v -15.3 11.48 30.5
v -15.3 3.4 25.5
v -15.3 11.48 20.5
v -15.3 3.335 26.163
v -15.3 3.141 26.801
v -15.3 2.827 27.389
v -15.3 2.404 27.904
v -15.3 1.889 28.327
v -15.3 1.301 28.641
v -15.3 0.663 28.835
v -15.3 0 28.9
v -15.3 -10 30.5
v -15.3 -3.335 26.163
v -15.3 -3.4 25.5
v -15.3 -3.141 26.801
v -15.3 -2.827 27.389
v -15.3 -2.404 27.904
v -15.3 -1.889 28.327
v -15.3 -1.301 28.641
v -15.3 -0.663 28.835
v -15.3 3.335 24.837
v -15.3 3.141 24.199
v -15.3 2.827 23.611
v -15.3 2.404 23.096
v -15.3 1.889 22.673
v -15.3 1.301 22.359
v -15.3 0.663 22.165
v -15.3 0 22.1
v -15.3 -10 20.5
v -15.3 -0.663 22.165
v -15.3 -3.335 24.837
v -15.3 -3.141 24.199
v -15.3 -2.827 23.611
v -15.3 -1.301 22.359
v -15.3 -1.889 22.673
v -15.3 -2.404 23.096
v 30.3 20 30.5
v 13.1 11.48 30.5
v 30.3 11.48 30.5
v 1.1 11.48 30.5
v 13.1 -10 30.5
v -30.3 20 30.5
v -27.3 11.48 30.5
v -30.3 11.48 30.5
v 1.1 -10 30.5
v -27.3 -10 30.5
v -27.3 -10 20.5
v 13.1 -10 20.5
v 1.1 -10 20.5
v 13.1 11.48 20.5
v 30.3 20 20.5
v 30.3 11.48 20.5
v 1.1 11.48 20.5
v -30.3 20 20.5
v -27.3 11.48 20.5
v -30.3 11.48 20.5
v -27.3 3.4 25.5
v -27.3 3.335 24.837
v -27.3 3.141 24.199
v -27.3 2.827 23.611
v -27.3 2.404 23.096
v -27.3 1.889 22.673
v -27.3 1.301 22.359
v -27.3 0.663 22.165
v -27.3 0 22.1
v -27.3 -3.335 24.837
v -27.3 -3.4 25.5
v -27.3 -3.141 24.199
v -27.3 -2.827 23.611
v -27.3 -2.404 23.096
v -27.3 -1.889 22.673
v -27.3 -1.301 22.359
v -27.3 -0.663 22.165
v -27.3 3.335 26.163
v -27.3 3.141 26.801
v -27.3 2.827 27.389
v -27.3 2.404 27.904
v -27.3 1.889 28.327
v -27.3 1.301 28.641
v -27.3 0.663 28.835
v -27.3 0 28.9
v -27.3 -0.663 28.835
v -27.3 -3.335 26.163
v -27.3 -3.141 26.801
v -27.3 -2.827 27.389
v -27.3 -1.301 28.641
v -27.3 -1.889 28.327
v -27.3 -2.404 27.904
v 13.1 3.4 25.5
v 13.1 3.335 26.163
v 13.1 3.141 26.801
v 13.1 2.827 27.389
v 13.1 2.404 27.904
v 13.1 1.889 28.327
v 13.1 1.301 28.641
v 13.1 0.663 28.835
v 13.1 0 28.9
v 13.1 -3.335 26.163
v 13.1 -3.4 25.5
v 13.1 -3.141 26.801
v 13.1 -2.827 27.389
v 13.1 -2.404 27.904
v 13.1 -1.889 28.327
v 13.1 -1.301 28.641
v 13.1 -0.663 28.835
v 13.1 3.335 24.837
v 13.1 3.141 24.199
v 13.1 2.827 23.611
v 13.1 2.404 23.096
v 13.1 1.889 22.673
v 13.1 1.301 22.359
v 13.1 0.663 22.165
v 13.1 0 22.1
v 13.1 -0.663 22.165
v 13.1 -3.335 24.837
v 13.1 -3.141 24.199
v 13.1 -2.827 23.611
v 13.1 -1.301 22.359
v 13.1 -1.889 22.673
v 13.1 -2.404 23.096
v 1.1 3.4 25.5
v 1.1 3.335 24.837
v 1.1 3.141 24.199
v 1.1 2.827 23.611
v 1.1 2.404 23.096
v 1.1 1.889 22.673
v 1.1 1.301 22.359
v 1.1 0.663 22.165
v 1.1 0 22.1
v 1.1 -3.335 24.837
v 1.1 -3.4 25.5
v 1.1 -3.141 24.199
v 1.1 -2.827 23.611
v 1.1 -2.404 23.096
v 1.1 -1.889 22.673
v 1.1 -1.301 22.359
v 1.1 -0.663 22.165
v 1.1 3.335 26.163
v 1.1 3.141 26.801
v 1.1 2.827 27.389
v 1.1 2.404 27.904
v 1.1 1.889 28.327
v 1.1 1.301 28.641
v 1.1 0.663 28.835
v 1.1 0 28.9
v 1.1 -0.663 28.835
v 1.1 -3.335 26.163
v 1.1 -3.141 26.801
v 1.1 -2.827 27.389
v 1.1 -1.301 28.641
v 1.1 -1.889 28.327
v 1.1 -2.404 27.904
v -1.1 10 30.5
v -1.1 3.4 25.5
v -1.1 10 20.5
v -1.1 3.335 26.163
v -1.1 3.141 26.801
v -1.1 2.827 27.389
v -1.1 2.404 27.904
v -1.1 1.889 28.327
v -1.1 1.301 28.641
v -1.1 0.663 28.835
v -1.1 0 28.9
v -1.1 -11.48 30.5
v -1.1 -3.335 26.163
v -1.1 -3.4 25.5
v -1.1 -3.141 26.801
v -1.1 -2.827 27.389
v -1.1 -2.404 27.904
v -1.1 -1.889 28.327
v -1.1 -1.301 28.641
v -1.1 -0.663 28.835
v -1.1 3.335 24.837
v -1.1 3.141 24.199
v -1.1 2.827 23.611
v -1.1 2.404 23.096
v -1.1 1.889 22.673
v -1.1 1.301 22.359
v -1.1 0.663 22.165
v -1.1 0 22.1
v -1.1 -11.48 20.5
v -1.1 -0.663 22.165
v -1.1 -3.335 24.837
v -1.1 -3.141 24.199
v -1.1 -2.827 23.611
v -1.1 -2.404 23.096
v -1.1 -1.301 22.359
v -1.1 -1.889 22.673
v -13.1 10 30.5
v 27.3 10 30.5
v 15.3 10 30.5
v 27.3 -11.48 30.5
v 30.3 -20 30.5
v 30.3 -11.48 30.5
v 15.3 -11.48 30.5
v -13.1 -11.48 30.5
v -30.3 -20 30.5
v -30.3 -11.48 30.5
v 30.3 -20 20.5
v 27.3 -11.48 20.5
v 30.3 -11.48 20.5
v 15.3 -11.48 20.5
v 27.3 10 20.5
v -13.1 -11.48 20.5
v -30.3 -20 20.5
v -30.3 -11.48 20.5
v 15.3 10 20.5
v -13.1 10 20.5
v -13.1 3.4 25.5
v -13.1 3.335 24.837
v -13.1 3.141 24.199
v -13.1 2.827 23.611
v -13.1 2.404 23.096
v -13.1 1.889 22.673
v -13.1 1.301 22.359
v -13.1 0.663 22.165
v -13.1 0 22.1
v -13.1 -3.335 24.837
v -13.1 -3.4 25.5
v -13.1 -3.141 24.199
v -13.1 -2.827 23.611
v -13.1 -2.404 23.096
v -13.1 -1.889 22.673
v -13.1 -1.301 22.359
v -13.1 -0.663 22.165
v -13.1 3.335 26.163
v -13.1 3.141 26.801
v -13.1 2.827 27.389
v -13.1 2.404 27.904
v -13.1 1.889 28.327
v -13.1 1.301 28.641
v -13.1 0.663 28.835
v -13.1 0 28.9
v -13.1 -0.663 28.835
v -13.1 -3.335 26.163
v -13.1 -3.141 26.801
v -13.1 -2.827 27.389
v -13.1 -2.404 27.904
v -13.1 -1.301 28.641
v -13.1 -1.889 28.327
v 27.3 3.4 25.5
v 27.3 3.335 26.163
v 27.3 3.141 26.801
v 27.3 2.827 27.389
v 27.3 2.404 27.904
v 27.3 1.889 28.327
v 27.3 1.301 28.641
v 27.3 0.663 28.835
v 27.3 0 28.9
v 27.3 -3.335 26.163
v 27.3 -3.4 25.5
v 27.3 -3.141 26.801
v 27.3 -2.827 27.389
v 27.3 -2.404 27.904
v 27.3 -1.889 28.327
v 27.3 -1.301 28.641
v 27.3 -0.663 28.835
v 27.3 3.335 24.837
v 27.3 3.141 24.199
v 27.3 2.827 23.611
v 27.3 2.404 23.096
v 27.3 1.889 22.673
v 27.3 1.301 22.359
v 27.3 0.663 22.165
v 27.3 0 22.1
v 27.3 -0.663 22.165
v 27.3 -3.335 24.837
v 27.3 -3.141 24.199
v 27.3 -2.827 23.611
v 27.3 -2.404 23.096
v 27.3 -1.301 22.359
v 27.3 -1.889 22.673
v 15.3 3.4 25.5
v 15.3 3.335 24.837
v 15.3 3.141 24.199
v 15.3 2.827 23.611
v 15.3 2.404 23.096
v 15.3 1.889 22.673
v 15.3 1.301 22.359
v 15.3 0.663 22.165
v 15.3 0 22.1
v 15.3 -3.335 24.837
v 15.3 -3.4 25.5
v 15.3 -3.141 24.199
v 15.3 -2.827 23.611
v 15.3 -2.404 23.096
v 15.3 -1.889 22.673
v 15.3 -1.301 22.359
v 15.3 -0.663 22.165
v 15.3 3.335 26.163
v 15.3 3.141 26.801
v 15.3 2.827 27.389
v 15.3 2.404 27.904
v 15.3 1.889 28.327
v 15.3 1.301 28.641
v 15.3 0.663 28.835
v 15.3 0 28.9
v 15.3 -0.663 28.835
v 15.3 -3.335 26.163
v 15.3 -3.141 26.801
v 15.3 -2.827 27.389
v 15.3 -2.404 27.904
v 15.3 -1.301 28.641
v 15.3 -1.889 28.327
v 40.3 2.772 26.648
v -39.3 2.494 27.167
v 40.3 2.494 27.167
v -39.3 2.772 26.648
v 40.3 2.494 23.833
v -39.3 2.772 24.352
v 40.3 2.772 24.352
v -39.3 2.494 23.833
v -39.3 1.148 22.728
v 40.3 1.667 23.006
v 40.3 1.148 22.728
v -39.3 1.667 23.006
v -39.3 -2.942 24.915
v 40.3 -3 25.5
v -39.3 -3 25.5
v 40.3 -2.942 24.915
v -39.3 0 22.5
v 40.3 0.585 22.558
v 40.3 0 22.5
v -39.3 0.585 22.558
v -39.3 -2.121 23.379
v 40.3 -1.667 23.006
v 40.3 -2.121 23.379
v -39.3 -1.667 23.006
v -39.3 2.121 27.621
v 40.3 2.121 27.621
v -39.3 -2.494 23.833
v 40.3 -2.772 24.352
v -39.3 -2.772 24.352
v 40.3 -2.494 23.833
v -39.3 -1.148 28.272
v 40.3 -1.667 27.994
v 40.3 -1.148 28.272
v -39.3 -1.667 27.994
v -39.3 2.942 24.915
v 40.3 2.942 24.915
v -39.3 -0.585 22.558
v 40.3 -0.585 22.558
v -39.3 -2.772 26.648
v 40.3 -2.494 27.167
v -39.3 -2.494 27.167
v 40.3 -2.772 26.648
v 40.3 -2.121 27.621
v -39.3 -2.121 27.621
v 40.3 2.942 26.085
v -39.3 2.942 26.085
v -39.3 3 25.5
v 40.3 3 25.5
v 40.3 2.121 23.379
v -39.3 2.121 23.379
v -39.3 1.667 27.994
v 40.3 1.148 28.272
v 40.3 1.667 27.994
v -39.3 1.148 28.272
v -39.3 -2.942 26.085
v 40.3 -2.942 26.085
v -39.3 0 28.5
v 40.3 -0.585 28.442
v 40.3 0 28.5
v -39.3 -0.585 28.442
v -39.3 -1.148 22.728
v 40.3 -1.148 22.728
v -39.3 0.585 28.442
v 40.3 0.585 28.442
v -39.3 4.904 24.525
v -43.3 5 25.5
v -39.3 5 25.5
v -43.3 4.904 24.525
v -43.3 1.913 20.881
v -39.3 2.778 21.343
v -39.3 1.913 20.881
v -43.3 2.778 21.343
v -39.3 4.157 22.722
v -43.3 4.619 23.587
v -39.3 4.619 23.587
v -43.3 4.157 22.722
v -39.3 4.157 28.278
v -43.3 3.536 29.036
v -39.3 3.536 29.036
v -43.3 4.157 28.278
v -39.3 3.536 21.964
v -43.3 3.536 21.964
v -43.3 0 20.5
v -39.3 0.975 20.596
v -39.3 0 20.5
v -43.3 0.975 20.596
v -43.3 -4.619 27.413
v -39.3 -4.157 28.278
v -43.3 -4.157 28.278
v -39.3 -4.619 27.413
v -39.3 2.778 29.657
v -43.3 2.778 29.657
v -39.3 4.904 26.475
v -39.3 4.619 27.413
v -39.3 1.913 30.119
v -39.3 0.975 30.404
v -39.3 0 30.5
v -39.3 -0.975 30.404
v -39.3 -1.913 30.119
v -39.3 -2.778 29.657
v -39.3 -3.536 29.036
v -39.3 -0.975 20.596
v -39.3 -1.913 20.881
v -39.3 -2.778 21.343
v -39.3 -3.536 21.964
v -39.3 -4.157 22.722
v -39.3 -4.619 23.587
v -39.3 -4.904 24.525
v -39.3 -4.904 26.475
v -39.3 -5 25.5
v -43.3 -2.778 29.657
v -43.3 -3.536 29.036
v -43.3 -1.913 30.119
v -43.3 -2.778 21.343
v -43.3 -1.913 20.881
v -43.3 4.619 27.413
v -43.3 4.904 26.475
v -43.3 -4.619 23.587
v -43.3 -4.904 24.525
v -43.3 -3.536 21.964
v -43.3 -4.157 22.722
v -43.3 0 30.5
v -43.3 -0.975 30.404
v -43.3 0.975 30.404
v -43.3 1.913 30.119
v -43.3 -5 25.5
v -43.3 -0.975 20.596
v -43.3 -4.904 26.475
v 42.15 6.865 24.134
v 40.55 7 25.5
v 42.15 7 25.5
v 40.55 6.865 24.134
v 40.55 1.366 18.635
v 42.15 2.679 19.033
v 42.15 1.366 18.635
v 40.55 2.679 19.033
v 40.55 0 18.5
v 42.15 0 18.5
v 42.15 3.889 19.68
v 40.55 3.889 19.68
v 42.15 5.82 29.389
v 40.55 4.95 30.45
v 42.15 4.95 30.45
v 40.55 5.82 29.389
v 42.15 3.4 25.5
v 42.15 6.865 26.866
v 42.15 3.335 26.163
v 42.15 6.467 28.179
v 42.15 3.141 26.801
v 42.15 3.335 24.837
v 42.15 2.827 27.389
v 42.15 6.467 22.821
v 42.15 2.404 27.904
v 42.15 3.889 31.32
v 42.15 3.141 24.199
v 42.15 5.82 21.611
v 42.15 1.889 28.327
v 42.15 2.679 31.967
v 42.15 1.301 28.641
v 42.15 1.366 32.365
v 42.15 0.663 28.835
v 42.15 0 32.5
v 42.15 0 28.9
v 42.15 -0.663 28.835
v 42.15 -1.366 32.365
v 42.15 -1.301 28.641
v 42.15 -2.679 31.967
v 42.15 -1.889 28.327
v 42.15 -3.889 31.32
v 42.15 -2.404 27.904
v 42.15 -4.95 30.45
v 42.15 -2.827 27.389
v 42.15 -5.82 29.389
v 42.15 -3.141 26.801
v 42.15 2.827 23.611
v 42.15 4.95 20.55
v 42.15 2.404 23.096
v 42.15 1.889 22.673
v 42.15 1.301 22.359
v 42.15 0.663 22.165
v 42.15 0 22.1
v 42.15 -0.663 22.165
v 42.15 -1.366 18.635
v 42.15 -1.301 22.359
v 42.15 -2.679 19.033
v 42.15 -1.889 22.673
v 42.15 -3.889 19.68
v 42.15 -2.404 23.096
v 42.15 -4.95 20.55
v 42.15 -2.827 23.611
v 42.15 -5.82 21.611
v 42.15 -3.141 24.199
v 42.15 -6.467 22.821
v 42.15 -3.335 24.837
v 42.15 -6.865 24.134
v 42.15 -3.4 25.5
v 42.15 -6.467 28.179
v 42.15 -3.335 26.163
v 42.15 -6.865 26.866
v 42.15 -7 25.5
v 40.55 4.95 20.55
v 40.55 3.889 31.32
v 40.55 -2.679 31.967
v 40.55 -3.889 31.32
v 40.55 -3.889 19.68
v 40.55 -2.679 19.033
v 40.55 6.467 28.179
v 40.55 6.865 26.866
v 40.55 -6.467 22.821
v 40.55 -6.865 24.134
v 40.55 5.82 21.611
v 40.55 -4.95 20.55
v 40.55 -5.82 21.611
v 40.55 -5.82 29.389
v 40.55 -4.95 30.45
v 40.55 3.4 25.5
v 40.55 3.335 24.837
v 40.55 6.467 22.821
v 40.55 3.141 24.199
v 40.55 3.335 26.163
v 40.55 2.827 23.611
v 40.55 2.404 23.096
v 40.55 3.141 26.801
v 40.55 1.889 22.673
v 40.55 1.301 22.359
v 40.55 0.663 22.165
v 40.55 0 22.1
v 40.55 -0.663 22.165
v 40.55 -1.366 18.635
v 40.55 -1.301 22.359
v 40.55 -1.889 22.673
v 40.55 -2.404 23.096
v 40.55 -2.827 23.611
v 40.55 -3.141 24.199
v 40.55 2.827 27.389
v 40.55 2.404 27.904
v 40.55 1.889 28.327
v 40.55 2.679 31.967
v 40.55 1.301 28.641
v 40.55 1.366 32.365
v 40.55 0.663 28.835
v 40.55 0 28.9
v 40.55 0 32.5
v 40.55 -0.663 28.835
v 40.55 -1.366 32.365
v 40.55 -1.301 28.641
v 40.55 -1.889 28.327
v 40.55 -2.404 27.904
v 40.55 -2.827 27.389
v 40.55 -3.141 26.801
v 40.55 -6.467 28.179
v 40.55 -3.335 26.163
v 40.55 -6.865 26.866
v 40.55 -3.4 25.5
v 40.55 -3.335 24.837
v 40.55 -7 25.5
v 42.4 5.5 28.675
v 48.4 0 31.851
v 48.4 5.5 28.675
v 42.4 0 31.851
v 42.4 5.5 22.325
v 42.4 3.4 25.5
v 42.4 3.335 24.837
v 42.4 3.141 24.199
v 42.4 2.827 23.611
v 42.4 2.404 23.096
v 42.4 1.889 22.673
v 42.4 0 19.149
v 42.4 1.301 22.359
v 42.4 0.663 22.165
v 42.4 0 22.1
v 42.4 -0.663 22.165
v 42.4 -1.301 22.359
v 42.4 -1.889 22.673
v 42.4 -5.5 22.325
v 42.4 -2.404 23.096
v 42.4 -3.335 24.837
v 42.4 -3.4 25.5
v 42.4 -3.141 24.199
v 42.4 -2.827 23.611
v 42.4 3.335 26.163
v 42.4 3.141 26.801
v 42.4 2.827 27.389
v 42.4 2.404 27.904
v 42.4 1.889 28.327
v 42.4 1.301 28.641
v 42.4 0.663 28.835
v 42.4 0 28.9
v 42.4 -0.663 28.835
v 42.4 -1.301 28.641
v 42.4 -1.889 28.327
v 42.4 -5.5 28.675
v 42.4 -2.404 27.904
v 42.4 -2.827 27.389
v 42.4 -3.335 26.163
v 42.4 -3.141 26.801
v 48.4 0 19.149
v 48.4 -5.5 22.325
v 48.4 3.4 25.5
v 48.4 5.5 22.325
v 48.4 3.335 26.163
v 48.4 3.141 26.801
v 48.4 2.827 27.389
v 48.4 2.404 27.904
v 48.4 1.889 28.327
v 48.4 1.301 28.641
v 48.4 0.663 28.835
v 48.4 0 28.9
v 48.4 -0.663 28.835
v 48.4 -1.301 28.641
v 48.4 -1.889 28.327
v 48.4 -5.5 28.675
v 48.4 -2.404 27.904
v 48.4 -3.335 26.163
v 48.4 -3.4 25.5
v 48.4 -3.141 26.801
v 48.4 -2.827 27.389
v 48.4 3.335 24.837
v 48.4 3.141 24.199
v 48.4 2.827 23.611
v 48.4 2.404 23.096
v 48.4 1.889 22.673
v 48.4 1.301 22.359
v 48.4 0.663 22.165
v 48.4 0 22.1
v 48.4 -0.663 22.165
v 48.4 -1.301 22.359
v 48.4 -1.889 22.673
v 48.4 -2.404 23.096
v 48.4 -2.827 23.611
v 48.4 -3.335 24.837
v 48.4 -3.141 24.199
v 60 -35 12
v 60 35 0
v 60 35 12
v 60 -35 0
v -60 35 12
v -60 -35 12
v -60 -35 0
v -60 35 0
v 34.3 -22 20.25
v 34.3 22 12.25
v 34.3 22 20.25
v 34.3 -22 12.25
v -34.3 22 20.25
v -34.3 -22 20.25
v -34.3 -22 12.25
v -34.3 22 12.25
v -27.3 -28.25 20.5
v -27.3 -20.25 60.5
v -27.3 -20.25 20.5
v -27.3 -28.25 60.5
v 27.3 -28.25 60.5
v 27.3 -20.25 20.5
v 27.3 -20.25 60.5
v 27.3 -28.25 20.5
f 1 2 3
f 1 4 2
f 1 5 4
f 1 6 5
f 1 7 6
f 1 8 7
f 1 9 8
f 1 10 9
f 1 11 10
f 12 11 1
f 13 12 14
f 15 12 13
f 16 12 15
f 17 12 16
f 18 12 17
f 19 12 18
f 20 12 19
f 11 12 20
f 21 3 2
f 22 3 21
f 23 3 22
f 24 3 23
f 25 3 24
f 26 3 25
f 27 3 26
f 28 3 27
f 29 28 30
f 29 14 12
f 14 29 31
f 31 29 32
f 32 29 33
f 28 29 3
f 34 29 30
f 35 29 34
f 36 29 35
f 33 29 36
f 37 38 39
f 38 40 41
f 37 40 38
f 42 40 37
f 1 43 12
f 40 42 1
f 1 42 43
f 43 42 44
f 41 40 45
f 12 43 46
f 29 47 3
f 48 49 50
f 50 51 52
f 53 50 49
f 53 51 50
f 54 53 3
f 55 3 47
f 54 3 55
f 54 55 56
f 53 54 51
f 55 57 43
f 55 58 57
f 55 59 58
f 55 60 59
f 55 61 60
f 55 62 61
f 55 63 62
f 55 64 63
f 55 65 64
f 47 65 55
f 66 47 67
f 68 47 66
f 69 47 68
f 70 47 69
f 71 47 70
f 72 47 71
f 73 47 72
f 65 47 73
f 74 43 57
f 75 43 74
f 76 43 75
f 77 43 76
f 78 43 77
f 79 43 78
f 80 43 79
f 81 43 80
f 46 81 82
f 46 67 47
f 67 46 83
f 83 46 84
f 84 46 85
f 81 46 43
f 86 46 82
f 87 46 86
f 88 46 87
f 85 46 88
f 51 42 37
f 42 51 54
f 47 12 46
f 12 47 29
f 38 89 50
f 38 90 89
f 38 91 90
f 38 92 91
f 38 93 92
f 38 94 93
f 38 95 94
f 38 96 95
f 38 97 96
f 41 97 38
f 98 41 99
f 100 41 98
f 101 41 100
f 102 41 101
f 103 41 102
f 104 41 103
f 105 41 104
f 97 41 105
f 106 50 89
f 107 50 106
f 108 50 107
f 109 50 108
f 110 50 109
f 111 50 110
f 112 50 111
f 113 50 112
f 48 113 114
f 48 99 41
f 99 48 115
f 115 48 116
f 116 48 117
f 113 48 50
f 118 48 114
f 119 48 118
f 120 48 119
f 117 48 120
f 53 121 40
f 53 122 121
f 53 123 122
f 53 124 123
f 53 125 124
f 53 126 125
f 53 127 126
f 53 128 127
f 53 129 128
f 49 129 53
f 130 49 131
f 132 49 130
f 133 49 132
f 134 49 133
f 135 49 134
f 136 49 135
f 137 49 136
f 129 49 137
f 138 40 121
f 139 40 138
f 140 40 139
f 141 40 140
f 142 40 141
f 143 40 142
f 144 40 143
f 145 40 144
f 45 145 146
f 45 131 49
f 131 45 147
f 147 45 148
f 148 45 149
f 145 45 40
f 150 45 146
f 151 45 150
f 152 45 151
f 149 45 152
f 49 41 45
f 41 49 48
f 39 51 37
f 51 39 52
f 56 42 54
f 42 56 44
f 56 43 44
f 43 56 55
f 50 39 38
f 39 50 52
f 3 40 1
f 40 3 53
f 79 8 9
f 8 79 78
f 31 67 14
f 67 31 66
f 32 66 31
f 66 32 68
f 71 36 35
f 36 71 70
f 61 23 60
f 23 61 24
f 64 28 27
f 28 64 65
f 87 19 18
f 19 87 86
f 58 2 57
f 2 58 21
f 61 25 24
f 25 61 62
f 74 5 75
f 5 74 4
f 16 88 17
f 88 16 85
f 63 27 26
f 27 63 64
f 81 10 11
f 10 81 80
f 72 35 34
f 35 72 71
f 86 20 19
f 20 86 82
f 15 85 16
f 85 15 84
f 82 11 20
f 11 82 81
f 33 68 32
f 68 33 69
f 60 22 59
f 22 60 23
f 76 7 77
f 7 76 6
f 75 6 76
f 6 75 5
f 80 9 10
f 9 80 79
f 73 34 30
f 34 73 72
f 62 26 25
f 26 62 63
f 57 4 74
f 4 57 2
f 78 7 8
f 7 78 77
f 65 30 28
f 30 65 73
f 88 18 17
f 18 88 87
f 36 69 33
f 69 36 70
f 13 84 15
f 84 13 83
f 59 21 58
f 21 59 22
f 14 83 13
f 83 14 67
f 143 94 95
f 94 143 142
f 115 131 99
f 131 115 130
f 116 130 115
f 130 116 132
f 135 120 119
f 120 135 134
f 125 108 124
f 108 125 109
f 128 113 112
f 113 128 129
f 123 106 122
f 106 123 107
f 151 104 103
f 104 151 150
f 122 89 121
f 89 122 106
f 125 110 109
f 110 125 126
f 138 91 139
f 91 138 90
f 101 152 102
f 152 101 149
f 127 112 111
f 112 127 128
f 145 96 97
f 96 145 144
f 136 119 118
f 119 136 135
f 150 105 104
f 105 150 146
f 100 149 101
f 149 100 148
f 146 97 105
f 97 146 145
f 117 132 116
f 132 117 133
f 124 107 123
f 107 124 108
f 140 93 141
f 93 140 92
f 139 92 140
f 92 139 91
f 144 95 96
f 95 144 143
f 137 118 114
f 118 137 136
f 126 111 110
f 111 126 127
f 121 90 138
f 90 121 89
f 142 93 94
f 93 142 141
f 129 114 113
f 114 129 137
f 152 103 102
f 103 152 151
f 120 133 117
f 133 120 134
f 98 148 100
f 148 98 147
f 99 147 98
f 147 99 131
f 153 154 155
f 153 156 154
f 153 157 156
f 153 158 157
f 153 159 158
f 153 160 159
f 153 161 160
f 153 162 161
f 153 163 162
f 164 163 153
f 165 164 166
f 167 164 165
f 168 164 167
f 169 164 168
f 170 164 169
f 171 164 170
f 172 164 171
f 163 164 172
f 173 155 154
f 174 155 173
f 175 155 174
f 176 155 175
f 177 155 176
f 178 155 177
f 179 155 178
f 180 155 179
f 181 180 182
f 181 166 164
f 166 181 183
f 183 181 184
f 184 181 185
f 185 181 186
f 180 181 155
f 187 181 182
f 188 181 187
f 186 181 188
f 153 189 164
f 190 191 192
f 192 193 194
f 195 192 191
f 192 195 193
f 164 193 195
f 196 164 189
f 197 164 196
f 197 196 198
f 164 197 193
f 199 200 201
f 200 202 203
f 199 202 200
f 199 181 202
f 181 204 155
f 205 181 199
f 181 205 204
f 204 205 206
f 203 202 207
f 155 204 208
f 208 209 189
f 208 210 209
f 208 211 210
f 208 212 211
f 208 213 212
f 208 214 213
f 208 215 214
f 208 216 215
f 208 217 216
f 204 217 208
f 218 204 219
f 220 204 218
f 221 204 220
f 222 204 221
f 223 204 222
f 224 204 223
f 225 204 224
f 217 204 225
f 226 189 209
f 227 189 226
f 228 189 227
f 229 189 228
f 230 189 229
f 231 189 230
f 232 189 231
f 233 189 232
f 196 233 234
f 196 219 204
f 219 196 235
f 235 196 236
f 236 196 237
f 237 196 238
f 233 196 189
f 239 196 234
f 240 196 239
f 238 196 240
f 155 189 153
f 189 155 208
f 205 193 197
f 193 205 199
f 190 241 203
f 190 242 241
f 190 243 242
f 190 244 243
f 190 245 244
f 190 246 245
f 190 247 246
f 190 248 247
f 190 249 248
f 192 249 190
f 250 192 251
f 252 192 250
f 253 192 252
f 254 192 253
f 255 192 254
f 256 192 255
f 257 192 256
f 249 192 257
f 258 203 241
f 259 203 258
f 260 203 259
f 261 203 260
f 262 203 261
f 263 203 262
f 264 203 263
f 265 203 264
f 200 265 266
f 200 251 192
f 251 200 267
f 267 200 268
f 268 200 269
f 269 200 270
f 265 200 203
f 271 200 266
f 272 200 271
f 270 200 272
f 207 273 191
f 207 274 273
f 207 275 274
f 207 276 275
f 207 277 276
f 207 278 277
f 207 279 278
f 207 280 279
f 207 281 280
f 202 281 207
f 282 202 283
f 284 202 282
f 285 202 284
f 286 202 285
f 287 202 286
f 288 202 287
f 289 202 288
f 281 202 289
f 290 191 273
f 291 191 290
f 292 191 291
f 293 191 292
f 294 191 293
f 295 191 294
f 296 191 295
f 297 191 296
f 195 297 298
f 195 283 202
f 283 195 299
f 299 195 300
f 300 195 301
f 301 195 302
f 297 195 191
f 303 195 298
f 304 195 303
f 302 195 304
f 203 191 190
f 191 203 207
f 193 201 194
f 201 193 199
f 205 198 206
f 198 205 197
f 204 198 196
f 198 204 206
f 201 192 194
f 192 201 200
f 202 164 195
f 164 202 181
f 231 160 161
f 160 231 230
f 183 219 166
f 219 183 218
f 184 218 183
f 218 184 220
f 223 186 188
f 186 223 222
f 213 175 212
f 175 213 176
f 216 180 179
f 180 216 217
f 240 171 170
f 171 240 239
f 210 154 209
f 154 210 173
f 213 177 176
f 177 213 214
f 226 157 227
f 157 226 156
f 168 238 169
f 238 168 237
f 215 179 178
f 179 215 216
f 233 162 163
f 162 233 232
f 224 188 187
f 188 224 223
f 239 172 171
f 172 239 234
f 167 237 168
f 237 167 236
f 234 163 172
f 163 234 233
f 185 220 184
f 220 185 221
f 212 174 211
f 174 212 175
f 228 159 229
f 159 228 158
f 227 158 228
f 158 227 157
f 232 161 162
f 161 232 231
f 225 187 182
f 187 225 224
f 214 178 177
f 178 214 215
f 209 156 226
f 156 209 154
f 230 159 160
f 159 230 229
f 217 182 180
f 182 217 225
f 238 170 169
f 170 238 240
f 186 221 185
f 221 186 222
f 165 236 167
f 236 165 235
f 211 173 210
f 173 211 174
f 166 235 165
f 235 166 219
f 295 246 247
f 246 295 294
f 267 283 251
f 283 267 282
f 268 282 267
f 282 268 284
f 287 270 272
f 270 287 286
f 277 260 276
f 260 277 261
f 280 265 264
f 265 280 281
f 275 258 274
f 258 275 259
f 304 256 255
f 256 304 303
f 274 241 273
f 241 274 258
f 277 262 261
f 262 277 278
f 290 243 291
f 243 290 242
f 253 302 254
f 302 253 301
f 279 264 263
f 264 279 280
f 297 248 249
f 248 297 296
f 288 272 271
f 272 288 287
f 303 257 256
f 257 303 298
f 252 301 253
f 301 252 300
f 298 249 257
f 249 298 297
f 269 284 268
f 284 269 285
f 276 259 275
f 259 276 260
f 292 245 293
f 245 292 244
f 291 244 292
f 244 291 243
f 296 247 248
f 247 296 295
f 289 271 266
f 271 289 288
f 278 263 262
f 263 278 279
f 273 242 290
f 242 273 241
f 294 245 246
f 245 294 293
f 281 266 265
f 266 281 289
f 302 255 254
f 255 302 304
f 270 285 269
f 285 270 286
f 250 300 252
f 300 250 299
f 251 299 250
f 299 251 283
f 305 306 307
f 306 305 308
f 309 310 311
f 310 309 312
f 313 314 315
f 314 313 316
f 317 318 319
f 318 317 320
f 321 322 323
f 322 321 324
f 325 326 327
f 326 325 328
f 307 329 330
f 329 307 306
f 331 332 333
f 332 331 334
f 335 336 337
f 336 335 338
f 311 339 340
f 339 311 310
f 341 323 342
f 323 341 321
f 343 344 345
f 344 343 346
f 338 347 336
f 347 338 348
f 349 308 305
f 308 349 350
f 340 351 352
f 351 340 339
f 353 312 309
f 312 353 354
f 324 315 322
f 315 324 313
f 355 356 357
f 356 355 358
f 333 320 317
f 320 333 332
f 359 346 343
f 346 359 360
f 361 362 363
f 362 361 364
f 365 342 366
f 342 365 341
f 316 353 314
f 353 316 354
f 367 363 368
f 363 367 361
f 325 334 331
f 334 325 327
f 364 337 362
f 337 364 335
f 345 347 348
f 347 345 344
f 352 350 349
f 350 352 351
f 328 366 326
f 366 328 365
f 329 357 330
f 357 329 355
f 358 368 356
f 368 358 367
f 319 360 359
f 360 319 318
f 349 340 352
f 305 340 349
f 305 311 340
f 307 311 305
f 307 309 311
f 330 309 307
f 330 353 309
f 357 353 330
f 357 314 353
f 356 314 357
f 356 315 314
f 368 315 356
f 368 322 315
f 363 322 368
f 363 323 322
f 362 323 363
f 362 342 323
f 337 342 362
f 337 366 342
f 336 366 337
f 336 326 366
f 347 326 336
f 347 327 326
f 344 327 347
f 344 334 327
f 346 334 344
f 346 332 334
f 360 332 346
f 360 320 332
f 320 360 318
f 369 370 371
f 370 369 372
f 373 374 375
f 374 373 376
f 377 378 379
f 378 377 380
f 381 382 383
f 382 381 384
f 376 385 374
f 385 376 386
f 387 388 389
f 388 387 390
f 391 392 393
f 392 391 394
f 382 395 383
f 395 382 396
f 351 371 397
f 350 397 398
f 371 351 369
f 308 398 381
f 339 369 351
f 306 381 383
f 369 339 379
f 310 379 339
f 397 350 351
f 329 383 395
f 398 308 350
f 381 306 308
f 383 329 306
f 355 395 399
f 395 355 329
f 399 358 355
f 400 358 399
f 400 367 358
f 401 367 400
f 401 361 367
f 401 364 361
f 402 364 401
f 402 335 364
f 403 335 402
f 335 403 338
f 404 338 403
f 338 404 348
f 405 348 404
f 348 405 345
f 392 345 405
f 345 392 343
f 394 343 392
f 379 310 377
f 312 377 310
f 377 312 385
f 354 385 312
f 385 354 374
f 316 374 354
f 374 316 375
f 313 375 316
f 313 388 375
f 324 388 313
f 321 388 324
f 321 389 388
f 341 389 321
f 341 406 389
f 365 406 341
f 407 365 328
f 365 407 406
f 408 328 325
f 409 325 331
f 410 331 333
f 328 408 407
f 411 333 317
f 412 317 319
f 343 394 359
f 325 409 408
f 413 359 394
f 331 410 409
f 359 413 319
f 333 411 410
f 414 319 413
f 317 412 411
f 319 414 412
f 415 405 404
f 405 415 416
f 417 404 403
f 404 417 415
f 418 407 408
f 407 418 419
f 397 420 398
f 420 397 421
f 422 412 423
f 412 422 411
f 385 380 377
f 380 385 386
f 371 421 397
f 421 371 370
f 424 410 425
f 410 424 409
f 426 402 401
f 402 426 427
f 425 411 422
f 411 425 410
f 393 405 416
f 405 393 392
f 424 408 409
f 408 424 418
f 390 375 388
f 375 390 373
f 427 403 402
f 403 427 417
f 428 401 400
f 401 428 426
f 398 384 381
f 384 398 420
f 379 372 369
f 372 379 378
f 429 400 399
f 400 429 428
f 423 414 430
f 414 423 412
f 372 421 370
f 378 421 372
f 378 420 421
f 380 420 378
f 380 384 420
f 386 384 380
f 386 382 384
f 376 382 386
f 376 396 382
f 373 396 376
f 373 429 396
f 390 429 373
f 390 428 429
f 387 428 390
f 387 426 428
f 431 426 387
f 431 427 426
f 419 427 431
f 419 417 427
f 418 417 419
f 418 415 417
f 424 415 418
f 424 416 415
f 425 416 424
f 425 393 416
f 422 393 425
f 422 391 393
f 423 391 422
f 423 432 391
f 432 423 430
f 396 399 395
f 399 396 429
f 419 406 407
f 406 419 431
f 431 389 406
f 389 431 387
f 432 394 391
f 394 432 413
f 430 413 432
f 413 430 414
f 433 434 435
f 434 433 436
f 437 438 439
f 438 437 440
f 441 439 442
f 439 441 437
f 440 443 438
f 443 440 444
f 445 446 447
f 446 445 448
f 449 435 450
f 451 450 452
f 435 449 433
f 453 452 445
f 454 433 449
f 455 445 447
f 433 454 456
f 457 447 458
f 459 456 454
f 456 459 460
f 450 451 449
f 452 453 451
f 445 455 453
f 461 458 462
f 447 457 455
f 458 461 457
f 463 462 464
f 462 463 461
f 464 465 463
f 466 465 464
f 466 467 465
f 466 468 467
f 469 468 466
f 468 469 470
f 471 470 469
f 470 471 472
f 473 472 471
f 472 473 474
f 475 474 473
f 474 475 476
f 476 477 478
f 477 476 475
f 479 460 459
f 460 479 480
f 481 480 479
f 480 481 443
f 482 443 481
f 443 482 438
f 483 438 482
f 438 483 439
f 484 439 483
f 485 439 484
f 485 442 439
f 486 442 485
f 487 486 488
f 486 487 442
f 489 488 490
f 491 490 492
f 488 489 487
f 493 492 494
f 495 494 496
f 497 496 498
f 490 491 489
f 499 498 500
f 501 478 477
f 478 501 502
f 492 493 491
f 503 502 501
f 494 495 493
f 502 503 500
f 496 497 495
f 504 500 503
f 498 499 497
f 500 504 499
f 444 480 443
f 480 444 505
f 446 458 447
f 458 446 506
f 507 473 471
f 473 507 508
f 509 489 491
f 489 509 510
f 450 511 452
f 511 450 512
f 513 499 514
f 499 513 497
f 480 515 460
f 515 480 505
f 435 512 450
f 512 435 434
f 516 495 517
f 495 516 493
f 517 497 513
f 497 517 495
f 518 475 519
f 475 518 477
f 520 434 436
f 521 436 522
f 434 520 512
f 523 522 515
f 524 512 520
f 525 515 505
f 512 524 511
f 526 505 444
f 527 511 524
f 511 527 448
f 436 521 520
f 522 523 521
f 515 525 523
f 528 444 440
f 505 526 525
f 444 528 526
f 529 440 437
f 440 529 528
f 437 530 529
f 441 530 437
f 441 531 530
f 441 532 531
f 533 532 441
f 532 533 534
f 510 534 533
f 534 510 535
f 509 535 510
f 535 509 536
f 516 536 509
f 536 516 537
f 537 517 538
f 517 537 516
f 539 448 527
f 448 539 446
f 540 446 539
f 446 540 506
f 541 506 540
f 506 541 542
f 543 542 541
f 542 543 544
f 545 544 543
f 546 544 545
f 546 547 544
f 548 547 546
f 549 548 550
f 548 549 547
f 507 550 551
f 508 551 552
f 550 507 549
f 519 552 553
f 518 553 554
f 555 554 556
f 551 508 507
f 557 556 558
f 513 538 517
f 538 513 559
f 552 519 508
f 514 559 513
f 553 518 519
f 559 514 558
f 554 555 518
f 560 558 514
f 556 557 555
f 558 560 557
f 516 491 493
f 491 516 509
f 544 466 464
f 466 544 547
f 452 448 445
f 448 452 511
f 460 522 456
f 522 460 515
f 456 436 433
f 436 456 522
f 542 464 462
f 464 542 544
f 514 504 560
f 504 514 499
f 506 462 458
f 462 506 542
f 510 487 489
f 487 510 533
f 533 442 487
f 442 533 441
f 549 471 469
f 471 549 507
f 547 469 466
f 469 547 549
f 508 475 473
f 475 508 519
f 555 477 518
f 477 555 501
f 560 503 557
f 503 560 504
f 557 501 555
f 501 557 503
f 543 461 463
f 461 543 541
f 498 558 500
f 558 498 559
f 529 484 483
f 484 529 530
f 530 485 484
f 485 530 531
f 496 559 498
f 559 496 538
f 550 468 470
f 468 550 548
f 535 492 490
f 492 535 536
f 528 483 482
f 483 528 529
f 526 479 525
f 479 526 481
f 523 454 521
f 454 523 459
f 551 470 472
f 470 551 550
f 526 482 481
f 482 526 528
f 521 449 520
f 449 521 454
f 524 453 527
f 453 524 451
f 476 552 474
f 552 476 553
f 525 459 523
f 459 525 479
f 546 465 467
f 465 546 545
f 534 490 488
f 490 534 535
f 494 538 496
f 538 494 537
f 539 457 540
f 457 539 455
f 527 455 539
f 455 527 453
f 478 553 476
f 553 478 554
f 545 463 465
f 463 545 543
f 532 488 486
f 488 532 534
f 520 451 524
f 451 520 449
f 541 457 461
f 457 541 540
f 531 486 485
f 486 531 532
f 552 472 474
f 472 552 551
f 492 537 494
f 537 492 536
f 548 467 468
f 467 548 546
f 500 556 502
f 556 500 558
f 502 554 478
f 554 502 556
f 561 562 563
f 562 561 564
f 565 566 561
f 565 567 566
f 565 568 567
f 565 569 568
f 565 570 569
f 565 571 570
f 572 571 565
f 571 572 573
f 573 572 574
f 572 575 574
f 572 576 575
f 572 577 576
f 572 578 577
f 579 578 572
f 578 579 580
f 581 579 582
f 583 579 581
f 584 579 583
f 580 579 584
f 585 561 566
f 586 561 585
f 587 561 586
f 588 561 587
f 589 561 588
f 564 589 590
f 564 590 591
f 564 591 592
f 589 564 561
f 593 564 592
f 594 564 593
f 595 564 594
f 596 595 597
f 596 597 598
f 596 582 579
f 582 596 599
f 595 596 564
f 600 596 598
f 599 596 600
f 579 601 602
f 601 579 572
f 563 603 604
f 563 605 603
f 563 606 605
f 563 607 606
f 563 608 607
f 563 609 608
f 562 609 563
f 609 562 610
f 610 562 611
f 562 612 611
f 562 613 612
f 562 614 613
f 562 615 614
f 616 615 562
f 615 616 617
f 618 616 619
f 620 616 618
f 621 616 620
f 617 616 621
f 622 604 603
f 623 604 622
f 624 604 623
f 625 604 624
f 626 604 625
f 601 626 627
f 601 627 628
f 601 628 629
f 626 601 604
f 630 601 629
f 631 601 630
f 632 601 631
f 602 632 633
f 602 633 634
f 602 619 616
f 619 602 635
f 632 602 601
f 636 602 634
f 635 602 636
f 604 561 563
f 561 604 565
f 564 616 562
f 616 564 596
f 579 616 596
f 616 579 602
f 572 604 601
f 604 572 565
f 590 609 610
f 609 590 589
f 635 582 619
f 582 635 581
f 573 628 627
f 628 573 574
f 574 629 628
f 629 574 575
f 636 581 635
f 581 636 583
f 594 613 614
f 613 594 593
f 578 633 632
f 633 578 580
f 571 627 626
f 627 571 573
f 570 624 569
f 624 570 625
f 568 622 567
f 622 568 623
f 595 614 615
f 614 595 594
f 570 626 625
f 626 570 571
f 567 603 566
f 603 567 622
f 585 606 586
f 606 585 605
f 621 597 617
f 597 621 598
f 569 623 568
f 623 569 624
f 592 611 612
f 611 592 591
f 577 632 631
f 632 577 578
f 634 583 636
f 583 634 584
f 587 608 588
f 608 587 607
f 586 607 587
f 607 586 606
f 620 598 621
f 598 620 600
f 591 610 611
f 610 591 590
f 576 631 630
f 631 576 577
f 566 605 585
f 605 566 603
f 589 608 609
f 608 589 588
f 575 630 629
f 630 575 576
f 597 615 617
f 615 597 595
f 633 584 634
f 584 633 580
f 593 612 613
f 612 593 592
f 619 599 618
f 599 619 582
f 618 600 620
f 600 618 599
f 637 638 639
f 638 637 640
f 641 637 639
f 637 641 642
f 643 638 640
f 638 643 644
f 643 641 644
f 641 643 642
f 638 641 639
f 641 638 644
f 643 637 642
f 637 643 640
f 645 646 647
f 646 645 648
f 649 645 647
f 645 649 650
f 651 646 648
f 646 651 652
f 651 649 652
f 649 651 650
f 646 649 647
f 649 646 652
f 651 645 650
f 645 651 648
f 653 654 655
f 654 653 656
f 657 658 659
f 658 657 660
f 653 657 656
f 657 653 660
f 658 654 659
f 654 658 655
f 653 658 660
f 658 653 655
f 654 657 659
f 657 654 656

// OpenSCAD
$fn = 32;

// ------------------------------------------------------------------------
// Comb hinge with flap: leaf 60.6 x 20 mm, pin d6, flap 40 mm
// Every part is its own module, assembly() places every instance.
// ------------------------------------------------------------------------

// --- part 1 ---
module hinge_bed() {
  difference() {
    translate([-60, -35, 0]) cube([120, 70, 12]);
  }
}

// --- part 2 ---
module hinge_riser() {
  difference() {
    translate([-34.3, -22, 0]) cube([68.6, 44, 8]);
  }
}

// --- part 3 ---
module hinge_leaf_a() {
  difference() {
    union() {
      translate([-27.3, -10, -5]) cube([12, 30, 10]);
      translate([1.1, -10, -5]) cube([12, 30, 10]);
      translate([-30.3, 11.48, -5]) cube([60.6, 8.52, 10]);
    }
    translate([-21.3, 0, 0]) rotate([0, 90, 0]) cylinder(h = 14, d = 6.8, center = true);
    translate([7.1, 0, 0]) rotate([0, 90, 0]) cylinder(h = 14, d = 6.8, center = true);
  }
}

// --- part 4 ---
module hinge_leaf_b() {
  difference() {
    union() {
      translate([-13.1, -20, -5]) cube([12, 30, 10]);
      translate([15.3, -20, -5]) cube([12, 30, 10]);
      translate([-30.3, -20, -5]) cube([60.6, 8.52, 10]);
    }
    translate([-7.1, 0, 0]) rotate([0, 90, 0]) cylinder(h = 14, d = 6.8, center = true);
    translate([21.3, 0, 0]) rotate([0, 90, 0]) cylinder(h = 14, d = 6.8, center = true);
  }
}

// --- part 5 ---
module hinge_flap() {
  difference() {
    translate([-27.3, -20, 0]) cube([54.6, 40, 8]);
  }
}

// --- part 6 ---
module hinge_pin() {
  rotate([0, 90, 0]) cylinder(h = 80.6, d = 6, center = true);
  translate([-43.3, 0, 0]) rotate([0, 90, 0]) cylinder(h = 4, d = 10);
}

// --- part 7 ---
module pin_washer() {
  difference() {
      translate([0, 0, 0]) cylinder(h = 1.6, d = 14);
      translate([0, 0, -1]) cylinder(h = 3.6, d = 6.8);
    }
}

// --- part 8 ---
module pin_nut() {
  difference() {
    linear_extrude(height = 6) polygon(points = [[6.351, 0], [3.175, 5.5], [-3.175, 5.5], [-6.351, 0], [-3.175, -5.5], [3.175, -5.5]]);
    translate([0, 0, -1]) cylinder(h = 8, d = 6.8);
  }
}

// --- assembly ---
module assembly() {
  color([0.80, 0.24, 0.20]) translate([0, 0, 0]) rotate([0, 0, 0]) hinge_bed();
  color([0.20, 0.45, 0.75]) translate([0, 0, 12.25]) rotate([0, 0, 0]) hinge_riser();
  color([0.25, 0.62, 0.32]) translate([0, 0, 25.5]) rotate([0, 0, 0]) hinge_leaf_a();
  color([0.92, 0.70, 0.18]) translate([0, 0, 25.5]) rotate([0, 0, 0]) hinge_leaf_b();
  color([0.58, 0.35, 0.70]) translate([0, -20.25, 40.5]) rotate([90, 0, 0]) hinge_flap();
  color([0.16, 0.66, 0.66]) translate([0, 0, 25.5]) rotate([0, 0, 0]) hinge_pin();
  color([0.85, 0.48, 0.18]) translate([40.55, 0, 25.5]) rotate([0, 90, 0]) pin_washer();
  color([0.55, 0.60, 0.65]) translate([42.4, 0, 25.5]) rotate([0, 90, 0]) pin_nut();
}

assembly();
